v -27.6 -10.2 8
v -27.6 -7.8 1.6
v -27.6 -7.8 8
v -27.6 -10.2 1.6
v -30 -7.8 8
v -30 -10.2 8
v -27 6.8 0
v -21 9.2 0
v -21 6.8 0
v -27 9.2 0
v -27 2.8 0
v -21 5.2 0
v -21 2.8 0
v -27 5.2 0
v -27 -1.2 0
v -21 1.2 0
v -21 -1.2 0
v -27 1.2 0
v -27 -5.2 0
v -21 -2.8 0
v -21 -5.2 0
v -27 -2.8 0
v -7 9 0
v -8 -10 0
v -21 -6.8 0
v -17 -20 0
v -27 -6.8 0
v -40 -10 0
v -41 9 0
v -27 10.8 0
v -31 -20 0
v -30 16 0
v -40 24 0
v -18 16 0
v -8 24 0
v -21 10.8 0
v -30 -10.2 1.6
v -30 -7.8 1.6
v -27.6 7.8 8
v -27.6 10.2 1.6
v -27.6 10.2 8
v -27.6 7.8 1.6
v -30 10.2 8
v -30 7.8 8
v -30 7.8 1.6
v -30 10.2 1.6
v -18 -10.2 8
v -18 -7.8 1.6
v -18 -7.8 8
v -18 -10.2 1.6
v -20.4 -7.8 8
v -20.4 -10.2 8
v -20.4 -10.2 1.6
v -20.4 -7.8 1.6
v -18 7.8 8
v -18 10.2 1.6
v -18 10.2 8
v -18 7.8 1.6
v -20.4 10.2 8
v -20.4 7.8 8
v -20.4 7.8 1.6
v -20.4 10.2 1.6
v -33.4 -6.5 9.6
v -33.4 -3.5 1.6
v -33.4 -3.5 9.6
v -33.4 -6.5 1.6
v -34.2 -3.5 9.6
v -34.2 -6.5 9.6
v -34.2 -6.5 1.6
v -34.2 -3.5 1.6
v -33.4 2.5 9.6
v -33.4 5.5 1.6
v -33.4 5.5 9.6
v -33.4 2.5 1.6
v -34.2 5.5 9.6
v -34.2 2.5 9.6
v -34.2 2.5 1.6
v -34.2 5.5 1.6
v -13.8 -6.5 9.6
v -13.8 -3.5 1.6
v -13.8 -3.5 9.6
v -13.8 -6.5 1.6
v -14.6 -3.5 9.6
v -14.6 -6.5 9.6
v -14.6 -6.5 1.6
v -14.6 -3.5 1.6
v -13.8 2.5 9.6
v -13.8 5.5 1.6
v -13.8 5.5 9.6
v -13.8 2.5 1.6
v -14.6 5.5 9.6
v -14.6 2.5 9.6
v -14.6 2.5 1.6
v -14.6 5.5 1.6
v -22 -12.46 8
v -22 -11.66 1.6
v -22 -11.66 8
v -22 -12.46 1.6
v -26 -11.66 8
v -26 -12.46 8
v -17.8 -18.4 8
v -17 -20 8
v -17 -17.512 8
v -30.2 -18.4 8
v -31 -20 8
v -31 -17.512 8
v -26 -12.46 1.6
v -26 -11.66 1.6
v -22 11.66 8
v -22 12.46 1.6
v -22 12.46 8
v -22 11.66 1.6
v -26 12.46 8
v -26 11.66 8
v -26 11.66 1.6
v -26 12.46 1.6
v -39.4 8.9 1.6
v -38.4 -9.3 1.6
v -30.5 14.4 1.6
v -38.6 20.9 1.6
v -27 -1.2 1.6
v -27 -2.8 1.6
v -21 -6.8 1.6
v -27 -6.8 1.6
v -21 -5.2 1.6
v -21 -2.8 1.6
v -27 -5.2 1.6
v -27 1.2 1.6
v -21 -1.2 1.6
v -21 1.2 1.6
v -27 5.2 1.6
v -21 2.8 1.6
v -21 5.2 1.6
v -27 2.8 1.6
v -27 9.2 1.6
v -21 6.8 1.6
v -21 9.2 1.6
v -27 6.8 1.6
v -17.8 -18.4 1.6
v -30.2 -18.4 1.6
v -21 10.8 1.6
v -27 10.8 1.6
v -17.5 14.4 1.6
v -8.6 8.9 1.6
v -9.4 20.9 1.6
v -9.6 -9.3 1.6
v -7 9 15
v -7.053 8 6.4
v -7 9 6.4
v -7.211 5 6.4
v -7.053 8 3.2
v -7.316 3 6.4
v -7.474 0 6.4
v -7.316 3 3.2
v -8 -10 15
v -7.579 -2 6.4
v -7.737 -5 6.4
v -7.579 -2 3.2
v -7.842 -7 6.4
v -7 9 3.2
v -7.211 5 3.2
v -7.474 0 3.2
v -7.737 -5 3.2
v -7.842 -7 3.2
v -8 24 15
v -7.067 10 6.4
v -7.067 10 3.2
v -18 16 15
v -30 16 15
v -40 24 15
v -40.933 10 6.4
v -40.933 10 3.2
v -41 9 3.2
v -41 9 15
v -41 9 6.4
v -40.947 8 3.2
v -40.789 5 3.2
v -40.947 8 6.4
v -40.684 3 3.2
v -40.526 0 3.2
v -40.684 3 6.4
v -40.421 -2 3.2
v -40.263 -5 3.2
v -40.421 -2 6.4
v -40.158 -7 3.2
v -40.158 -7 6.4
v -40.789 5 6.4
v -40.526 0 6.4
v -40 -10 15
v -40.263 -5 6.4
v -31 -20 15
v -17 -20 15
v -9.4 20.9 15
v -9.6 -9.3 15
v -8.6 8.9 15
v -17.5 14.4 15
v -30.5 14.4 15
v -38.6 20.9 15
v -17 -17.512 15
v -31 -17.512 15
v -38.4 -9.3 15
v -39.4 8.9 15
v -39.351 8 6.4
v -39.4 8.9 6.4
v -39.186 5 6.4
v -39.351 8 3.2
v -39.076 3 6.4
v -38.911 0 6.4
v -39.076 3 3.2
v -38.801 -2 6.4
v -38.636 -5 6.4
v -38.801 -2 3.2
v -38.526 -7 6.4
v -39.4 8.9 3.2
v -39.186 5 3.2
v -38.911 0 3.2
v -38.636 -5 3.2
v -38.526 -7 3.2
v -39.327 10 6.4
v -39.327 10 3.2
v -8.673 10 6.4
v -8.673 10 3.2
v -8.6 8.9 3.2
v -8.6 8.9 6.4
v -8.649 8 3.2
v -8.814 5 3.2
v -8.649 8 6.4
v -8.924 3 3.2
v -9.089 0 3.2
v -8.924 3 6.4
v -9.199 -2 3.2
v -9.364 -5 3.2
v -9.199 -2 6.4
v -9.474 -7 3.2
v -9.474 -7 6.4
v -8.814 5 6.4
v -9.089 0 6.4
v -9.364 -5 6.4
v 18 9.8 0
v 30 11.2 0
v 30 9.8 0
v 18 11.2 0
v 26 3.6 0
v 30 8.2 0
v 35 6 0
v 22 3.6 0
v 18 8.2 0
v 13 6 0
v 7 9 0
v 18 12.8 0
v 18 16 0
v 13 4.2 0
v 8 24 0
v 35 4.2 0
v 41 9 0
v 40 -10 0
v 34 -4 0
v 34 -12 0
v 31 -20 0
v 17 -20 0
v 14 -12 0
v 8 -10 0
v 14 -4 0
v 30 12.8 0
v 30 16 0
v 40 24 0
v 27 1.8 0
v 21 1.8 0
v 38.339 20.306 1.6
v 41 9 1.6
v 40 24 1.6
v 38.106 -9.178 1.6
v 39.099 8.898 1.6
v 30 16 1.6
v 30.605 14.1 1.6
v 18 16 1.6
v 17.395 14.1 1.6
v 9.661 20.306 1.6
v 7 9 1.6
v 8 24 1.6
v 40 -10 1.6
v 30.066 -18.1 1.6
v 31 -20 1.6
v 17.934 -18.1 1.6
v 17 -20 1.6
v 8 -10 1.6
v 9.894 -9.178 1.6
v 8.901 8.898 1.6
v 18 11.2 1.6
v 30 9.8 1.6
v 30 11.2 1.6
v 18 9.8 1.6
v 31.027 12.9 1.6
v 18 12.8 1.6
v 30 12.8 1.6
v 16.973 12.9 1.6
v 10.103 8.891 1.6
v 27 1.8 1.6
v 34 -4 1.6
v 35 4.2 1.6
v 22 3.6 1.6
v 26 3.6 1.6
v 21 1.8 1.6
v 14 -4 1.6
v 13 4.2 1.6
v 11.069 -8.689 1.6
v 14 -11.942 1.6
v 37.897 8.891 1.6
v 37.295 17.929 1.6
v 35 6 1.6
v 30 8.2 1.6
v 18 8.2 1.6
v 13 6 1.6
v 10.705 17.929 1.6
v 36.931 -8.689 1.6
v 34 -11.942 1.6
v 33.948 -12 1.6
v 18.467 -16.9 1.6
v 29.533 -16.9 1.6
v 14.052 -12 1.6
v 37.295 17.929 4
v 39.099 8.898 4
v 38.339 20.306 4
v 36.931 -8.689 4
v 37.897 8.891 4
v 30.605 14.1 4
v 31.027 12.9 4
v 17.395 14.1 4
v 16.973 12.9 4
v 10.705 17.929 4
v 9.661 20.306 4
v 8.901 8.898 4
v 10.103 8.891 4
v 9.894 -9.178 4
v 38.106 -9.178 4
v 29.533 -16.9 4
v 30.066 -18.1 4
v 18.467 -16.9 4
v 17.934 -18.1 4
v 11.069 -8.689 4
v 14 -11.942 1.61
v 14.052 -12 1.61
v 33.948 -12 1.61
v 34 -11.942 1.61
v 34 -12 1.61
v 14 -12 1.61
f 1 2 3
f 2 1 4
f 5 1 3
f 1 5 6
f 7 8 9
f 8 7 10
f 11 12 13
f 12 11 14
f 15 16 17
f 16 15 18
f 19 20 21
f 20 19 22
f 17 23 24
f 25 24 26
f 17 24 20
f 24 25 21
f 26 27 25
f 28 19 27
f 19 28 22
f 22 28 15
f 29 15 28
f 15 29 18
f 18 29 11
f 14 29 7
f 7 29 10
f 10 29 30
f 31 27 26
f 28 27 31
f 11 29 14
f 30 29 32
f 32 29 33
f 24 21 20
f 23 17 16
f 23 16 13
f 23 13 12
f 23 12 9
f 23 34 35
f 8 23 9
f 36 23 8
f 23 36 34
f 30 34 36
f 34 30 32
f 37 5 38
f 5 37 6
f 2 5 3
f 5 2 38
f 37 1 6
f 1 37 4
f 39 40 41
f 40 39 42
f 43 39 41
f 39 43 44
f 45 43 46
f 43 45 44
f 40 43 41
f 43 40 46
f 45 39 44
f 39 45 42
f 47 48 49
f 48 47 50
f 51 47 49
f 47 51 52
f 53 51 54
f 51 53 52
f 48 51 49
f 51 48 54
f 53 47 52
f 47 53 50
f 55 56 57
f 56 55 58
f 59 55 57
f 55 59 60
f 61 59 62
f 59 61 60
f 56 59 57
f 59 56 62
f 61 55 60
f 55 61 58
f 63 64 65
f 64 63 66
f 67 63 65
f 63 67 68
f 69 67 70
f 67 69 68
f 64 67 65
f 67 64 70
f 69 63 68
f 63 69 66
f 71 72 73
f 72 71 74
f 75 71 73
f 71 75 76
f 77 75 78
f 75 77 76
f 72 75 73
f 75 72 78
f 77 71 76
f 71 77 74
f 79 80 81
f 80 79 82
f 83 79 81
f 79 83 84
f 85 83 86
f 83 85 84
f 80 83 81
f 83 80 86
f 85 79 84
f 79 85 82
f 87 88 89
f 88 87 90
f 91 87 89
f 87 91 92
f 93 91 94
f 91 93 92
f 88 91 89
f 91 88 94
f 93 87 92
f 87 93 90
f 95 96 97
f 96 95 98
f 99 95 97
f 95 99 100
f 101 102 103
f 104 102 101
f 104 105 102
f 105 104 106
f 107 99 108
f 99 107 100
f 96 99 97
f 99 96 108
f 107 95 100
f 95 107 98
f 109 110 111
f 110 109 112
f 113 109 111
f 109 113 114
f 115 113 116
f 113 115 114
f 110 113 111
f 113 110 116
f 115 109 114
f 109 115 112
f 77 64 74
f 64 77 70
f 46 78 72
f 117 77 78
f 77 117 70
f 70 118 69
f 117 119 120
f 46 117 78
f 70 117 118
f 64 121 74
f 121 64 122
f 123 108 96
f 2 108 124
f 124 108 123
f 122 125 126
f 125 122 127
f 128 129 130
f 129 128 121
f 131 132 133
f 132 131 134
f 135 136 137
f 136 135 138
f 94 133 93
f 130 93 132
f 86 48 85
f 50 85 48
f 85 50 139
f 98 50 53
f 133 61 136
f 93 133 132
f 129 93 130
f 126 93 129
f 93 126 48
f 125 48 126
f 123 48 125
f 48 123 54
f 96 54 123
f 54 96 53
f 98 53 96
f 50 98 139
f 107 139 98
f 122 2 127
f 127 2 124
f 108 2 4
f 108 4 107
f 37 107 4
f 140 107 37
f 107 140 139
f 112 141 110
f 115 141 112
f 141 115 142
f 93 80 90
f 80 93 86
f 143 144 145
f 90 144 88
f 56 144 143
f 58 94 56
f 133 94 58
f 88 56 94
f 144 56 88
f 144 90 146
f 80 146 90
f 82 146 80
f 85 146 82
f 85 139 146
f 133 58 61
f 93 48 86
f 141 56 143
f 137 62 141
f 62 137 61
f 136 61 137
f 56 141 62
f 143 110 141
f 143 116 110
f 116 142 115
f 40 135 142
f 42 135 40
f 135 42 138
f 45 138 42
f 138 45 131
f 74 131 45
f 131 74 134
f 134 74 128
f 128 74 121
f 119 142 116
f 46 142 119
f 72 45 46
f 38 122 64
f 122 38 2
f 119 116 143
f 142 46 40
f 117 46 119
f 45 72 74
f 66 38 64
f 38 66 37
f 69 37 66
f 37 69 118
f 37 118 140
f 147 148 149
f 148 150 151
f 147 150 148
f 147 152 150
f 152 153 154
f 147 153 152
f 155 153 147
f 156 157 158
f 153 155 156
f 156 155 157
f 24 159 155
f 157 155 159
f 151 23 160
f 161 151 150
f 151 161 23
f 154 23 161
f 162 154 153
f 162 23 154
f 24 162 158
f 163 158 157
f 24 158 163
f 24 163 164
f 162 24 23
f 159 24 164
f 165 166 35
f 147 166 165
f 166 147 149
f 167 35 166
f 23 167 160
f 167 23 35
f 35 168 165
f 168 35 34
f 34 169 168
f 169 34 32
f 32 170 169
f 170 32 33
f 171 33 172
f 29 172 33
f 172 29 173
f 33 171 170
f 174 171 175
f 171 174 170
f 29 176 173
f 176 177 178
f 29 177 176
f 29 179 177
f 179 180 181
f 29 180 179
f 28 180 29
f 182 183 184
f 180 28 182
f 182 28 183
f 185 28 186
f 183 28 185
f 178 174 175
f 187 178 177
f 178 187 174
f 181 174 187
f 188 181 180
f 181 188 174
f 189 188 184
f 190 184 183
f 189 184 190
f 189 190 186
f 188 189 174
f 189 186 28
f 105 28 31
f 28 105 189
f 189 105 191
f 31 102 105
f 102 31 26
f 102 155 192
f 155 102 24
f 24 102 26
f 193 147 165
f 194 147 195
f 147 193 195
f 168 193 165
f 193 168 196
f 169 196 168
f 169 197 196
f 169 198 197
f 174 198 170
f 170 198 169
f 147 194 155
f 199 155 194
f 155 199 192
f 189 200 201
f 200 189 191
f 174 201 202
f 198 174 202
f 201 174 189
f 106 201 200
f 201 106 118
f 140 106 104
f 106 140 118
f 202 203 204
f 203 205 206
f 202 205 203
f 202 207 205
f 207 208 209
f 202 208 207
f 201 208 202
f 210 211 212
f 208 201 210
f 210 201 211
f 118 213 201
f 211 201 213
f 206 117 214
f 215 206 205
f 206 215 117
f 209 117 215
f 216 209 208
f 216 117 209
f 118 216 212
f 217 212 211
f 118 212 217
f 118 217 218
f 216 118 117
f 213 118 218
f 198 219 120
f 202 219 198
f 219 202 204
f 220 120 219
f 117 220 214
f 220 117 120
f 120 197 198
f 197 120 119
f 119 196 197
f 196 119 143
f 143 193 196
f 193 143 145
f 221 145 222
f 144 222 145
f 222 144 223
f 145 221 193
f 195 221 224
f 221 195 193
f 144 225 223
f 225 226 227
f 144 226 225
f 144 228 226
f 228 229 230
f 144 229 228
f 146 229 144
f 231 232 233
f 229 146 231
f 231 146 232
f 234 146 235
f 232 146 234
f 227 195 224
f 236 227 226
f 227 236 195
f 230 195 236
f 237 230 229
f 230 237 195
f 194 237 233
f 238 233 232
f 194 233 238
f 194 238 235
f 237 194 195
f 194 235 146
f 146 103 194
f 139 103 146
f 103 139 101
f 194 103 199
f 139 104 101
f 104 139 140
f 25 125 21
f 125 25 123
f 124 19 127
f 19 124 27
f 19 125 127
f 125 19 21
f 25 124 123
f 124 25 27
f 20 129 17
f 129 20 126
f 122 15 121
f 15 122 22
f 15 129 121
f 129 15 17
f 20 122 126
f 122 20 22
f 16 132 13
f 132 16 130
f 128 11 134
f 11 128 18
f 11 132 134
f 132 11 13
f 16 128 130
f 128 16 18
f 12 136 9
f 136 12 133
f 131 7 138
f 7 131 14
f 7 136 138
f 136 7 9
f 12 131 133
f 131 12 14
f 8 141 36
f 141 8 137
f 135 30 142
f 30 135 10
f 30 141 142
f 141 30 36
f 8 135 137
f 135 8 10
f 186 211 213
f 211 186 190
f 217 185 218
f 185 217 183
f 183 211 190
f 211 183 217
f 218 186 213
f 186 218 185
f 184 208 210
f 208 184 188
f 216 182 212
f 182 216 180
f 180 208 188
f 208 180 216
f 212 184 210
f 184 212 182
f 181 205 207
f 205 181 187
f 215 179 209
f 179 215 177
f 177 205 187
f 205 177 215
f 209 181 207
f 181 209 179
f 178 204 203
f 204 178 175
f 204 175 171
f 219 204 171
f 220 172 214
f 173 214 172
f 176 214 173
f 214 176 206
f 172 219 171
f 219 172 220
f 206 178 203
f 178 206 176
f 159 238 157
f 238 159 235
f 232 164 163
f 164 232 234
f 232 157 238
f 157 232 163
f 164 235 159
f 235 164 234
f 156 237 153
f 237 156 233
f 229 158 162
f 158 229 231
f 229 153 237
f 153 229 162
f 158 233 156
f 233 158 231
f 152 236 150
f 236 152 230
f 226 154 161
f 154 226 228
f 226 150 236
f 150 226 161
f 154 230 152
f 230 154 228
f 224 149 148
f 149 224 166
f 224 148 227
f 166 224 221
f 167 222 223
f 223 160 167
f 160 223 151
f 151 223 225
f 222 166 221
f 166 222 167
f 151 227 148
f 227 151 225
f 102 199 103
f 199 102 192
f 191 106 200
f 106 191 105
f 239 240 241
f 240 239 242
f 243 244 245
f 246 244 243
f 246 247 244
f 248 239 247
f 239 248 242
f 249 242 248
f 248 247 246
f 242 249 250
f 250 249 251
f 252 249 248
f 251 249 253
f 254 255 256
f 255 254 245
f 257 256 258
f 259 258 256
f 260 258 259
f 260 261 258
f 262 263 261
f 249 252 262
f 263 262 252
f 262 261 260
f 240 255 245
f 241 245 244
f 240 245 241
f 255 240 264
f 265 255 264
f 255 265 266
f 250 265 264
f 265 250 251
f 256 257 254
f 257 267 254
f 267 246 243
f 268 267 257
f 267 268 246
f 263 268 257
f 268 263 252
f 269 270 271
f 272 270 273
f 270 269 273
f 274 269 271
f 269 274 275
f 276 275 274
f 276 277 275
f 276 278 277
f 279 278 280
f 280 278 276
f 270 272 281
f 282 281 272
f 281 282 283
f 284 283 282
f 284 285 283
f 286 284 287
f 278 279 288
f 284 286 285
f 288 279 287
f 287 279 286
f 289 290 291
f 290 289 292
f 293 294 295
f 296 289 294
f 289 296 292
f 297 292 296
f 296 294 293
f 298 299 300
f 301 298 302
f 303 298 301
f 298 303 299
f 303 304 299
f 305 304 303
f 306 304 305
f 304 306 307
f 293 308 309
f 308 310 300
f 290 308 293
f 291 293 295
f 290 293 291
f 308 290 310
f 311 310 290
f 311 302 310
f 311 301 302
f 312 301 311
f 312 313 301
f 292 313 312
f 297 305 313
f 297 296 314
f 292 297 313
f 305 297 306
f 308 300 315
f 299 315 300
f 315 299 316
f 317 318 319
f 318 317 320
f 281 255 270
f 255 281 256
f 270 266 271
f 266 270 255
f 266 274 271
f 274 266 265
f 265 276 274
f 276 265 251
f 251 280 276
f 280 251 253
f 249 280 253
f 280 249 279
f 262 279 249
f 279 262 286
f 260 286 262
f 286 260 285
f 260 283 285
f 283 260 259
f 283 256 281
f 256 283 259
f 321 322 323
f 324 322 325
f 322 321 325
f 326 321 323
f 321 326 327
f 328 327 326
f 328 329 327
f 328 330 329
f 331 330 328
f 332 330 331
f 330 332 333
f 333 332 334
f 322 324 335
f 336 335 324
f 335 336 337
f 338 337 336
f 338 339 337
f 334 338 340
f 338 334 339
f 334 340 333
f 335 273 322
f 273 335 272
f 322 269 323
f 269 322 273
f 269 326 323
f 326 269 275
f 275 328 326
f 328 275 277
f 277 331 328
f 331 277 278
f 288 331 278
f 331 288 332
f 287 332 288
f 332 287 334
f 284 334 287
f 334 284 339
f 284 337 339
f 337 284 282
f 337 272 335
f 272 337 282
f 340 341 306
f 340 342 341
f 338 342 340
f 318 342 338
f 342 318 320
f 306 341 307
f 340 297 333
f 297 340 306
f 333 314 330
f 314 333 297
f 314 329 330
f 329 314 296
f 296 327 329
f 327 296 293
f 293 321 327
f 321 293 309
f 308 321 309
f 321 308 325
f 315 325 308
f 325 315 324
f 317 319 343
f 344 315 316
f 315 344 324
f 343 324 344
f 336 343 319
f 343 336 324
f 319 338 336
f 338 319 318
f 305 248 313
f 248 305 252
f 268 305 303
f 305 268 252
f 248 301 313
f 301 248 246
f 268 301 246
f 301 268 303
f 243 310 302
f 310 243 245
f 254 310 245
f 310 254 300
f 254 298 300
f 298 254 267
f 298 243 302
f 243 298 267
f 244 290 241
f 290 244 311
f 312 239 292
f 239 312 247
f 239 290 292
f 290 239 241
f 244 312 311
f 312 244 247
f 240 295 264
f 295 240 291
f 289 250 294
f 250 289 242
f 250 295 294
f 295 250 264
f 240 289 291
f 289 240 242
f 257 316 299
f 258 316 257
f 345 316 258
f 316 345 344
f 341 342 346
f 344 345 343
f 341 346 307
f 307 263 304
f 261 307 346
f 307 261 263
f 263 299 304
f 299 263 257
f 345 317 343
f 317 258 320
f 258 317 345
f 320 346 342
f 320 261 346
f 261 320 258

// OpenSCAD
// RF5 WolfLab Wolf Vent / millimetres / physical fit unverified.
part="print"; // base, lid, print, assembly
pcb_width=18; pcb_length=22.52; pcb_bottom=8; pcb_thickness=1.6;
base_height=15; floor_thickness=1.6; lid_thickness=1.6;
fit_gap=.30; lip_height=2.4; lip_wall=1.2;
outline=[[-7,-20],[7,-20],[16,-10],[17,9],[16,24],[6,16],[-6,16],[-16,24],[-17,9],[-16,-10]];
inner=[[-6.2,-18.4],[6.2,-18.4],[14.4,-9.3],[15.4,8.9],[14.6,20.9],[6.5,14.4],[-6.5,14.4],[-14.6,20.9],[-15.4,8.9],[-14.4,-9.3]];
module rect(x,y,w,h,z,height){translate([x-w/2,y-h/2,z])cube([w,h,height]);}
module base(){difference(){union(){
 linear_extrude(floor_thickness)polygon(outline);
 linear_extrude(base_height)difference(){polygon(outline);polygon(inner);}
 for(x=[-4.8,4.8],y=[-9,9])rect(x,y,2.4,2.4,0,pcb_bottom);
 for(x=[-9.8,9.8],y=[-5,4])rect(x,y,.8,3,0,pcb_bottom+pcb_thickness);
 for(y=[-(pcb_length/2+.8),pcb_length/2+.8])rect(0,y,4,.8,0,pcb_bottom);
 }
 rect(0,-20,14,19.2,8,base_height);
 for(y=[-6,-2,2,6,10])rect(0,y,6,1.6,-.01,floor_thickness+.02);
 for(x=[-17,17],y=[-6,-1,4,9])rect(x,y,8,2,3.2,3.2);
}}
module lid(){difference(){union(){
 linear_extrude(lid_thickness)polygon(outline);
 translate([0,0,lid_thickness])linear_extrude(lip_height)difference(){
  offset(delta=-fit_gap)polygon(inner);offset(delta=-(fit_gap+lip_wall))polygon(inner);
 }
 }
 for(s=[-1,1])translate([0,0,-.01])linear_extrude(lid_thickness+.02)scale([s,1])polygon([[2,3.6],[11,6],[11,4.2],[3,1.8]]);
 rect(0,-8,20,8,-.01,lid_thickness+.02);
 for(y=[9,12])rect(0,y,12,1.6,-.01,lid_thickness+.02);
}}
if(part=="base")base();
else if(part=="lid")lid();
else if(part=="assembly"){base();translate([0,0,base_height+lid_thickness])rotate([0,180,0])lid();}
else{translate([-24,0,0])base();translate([24,0,0])lid();}
